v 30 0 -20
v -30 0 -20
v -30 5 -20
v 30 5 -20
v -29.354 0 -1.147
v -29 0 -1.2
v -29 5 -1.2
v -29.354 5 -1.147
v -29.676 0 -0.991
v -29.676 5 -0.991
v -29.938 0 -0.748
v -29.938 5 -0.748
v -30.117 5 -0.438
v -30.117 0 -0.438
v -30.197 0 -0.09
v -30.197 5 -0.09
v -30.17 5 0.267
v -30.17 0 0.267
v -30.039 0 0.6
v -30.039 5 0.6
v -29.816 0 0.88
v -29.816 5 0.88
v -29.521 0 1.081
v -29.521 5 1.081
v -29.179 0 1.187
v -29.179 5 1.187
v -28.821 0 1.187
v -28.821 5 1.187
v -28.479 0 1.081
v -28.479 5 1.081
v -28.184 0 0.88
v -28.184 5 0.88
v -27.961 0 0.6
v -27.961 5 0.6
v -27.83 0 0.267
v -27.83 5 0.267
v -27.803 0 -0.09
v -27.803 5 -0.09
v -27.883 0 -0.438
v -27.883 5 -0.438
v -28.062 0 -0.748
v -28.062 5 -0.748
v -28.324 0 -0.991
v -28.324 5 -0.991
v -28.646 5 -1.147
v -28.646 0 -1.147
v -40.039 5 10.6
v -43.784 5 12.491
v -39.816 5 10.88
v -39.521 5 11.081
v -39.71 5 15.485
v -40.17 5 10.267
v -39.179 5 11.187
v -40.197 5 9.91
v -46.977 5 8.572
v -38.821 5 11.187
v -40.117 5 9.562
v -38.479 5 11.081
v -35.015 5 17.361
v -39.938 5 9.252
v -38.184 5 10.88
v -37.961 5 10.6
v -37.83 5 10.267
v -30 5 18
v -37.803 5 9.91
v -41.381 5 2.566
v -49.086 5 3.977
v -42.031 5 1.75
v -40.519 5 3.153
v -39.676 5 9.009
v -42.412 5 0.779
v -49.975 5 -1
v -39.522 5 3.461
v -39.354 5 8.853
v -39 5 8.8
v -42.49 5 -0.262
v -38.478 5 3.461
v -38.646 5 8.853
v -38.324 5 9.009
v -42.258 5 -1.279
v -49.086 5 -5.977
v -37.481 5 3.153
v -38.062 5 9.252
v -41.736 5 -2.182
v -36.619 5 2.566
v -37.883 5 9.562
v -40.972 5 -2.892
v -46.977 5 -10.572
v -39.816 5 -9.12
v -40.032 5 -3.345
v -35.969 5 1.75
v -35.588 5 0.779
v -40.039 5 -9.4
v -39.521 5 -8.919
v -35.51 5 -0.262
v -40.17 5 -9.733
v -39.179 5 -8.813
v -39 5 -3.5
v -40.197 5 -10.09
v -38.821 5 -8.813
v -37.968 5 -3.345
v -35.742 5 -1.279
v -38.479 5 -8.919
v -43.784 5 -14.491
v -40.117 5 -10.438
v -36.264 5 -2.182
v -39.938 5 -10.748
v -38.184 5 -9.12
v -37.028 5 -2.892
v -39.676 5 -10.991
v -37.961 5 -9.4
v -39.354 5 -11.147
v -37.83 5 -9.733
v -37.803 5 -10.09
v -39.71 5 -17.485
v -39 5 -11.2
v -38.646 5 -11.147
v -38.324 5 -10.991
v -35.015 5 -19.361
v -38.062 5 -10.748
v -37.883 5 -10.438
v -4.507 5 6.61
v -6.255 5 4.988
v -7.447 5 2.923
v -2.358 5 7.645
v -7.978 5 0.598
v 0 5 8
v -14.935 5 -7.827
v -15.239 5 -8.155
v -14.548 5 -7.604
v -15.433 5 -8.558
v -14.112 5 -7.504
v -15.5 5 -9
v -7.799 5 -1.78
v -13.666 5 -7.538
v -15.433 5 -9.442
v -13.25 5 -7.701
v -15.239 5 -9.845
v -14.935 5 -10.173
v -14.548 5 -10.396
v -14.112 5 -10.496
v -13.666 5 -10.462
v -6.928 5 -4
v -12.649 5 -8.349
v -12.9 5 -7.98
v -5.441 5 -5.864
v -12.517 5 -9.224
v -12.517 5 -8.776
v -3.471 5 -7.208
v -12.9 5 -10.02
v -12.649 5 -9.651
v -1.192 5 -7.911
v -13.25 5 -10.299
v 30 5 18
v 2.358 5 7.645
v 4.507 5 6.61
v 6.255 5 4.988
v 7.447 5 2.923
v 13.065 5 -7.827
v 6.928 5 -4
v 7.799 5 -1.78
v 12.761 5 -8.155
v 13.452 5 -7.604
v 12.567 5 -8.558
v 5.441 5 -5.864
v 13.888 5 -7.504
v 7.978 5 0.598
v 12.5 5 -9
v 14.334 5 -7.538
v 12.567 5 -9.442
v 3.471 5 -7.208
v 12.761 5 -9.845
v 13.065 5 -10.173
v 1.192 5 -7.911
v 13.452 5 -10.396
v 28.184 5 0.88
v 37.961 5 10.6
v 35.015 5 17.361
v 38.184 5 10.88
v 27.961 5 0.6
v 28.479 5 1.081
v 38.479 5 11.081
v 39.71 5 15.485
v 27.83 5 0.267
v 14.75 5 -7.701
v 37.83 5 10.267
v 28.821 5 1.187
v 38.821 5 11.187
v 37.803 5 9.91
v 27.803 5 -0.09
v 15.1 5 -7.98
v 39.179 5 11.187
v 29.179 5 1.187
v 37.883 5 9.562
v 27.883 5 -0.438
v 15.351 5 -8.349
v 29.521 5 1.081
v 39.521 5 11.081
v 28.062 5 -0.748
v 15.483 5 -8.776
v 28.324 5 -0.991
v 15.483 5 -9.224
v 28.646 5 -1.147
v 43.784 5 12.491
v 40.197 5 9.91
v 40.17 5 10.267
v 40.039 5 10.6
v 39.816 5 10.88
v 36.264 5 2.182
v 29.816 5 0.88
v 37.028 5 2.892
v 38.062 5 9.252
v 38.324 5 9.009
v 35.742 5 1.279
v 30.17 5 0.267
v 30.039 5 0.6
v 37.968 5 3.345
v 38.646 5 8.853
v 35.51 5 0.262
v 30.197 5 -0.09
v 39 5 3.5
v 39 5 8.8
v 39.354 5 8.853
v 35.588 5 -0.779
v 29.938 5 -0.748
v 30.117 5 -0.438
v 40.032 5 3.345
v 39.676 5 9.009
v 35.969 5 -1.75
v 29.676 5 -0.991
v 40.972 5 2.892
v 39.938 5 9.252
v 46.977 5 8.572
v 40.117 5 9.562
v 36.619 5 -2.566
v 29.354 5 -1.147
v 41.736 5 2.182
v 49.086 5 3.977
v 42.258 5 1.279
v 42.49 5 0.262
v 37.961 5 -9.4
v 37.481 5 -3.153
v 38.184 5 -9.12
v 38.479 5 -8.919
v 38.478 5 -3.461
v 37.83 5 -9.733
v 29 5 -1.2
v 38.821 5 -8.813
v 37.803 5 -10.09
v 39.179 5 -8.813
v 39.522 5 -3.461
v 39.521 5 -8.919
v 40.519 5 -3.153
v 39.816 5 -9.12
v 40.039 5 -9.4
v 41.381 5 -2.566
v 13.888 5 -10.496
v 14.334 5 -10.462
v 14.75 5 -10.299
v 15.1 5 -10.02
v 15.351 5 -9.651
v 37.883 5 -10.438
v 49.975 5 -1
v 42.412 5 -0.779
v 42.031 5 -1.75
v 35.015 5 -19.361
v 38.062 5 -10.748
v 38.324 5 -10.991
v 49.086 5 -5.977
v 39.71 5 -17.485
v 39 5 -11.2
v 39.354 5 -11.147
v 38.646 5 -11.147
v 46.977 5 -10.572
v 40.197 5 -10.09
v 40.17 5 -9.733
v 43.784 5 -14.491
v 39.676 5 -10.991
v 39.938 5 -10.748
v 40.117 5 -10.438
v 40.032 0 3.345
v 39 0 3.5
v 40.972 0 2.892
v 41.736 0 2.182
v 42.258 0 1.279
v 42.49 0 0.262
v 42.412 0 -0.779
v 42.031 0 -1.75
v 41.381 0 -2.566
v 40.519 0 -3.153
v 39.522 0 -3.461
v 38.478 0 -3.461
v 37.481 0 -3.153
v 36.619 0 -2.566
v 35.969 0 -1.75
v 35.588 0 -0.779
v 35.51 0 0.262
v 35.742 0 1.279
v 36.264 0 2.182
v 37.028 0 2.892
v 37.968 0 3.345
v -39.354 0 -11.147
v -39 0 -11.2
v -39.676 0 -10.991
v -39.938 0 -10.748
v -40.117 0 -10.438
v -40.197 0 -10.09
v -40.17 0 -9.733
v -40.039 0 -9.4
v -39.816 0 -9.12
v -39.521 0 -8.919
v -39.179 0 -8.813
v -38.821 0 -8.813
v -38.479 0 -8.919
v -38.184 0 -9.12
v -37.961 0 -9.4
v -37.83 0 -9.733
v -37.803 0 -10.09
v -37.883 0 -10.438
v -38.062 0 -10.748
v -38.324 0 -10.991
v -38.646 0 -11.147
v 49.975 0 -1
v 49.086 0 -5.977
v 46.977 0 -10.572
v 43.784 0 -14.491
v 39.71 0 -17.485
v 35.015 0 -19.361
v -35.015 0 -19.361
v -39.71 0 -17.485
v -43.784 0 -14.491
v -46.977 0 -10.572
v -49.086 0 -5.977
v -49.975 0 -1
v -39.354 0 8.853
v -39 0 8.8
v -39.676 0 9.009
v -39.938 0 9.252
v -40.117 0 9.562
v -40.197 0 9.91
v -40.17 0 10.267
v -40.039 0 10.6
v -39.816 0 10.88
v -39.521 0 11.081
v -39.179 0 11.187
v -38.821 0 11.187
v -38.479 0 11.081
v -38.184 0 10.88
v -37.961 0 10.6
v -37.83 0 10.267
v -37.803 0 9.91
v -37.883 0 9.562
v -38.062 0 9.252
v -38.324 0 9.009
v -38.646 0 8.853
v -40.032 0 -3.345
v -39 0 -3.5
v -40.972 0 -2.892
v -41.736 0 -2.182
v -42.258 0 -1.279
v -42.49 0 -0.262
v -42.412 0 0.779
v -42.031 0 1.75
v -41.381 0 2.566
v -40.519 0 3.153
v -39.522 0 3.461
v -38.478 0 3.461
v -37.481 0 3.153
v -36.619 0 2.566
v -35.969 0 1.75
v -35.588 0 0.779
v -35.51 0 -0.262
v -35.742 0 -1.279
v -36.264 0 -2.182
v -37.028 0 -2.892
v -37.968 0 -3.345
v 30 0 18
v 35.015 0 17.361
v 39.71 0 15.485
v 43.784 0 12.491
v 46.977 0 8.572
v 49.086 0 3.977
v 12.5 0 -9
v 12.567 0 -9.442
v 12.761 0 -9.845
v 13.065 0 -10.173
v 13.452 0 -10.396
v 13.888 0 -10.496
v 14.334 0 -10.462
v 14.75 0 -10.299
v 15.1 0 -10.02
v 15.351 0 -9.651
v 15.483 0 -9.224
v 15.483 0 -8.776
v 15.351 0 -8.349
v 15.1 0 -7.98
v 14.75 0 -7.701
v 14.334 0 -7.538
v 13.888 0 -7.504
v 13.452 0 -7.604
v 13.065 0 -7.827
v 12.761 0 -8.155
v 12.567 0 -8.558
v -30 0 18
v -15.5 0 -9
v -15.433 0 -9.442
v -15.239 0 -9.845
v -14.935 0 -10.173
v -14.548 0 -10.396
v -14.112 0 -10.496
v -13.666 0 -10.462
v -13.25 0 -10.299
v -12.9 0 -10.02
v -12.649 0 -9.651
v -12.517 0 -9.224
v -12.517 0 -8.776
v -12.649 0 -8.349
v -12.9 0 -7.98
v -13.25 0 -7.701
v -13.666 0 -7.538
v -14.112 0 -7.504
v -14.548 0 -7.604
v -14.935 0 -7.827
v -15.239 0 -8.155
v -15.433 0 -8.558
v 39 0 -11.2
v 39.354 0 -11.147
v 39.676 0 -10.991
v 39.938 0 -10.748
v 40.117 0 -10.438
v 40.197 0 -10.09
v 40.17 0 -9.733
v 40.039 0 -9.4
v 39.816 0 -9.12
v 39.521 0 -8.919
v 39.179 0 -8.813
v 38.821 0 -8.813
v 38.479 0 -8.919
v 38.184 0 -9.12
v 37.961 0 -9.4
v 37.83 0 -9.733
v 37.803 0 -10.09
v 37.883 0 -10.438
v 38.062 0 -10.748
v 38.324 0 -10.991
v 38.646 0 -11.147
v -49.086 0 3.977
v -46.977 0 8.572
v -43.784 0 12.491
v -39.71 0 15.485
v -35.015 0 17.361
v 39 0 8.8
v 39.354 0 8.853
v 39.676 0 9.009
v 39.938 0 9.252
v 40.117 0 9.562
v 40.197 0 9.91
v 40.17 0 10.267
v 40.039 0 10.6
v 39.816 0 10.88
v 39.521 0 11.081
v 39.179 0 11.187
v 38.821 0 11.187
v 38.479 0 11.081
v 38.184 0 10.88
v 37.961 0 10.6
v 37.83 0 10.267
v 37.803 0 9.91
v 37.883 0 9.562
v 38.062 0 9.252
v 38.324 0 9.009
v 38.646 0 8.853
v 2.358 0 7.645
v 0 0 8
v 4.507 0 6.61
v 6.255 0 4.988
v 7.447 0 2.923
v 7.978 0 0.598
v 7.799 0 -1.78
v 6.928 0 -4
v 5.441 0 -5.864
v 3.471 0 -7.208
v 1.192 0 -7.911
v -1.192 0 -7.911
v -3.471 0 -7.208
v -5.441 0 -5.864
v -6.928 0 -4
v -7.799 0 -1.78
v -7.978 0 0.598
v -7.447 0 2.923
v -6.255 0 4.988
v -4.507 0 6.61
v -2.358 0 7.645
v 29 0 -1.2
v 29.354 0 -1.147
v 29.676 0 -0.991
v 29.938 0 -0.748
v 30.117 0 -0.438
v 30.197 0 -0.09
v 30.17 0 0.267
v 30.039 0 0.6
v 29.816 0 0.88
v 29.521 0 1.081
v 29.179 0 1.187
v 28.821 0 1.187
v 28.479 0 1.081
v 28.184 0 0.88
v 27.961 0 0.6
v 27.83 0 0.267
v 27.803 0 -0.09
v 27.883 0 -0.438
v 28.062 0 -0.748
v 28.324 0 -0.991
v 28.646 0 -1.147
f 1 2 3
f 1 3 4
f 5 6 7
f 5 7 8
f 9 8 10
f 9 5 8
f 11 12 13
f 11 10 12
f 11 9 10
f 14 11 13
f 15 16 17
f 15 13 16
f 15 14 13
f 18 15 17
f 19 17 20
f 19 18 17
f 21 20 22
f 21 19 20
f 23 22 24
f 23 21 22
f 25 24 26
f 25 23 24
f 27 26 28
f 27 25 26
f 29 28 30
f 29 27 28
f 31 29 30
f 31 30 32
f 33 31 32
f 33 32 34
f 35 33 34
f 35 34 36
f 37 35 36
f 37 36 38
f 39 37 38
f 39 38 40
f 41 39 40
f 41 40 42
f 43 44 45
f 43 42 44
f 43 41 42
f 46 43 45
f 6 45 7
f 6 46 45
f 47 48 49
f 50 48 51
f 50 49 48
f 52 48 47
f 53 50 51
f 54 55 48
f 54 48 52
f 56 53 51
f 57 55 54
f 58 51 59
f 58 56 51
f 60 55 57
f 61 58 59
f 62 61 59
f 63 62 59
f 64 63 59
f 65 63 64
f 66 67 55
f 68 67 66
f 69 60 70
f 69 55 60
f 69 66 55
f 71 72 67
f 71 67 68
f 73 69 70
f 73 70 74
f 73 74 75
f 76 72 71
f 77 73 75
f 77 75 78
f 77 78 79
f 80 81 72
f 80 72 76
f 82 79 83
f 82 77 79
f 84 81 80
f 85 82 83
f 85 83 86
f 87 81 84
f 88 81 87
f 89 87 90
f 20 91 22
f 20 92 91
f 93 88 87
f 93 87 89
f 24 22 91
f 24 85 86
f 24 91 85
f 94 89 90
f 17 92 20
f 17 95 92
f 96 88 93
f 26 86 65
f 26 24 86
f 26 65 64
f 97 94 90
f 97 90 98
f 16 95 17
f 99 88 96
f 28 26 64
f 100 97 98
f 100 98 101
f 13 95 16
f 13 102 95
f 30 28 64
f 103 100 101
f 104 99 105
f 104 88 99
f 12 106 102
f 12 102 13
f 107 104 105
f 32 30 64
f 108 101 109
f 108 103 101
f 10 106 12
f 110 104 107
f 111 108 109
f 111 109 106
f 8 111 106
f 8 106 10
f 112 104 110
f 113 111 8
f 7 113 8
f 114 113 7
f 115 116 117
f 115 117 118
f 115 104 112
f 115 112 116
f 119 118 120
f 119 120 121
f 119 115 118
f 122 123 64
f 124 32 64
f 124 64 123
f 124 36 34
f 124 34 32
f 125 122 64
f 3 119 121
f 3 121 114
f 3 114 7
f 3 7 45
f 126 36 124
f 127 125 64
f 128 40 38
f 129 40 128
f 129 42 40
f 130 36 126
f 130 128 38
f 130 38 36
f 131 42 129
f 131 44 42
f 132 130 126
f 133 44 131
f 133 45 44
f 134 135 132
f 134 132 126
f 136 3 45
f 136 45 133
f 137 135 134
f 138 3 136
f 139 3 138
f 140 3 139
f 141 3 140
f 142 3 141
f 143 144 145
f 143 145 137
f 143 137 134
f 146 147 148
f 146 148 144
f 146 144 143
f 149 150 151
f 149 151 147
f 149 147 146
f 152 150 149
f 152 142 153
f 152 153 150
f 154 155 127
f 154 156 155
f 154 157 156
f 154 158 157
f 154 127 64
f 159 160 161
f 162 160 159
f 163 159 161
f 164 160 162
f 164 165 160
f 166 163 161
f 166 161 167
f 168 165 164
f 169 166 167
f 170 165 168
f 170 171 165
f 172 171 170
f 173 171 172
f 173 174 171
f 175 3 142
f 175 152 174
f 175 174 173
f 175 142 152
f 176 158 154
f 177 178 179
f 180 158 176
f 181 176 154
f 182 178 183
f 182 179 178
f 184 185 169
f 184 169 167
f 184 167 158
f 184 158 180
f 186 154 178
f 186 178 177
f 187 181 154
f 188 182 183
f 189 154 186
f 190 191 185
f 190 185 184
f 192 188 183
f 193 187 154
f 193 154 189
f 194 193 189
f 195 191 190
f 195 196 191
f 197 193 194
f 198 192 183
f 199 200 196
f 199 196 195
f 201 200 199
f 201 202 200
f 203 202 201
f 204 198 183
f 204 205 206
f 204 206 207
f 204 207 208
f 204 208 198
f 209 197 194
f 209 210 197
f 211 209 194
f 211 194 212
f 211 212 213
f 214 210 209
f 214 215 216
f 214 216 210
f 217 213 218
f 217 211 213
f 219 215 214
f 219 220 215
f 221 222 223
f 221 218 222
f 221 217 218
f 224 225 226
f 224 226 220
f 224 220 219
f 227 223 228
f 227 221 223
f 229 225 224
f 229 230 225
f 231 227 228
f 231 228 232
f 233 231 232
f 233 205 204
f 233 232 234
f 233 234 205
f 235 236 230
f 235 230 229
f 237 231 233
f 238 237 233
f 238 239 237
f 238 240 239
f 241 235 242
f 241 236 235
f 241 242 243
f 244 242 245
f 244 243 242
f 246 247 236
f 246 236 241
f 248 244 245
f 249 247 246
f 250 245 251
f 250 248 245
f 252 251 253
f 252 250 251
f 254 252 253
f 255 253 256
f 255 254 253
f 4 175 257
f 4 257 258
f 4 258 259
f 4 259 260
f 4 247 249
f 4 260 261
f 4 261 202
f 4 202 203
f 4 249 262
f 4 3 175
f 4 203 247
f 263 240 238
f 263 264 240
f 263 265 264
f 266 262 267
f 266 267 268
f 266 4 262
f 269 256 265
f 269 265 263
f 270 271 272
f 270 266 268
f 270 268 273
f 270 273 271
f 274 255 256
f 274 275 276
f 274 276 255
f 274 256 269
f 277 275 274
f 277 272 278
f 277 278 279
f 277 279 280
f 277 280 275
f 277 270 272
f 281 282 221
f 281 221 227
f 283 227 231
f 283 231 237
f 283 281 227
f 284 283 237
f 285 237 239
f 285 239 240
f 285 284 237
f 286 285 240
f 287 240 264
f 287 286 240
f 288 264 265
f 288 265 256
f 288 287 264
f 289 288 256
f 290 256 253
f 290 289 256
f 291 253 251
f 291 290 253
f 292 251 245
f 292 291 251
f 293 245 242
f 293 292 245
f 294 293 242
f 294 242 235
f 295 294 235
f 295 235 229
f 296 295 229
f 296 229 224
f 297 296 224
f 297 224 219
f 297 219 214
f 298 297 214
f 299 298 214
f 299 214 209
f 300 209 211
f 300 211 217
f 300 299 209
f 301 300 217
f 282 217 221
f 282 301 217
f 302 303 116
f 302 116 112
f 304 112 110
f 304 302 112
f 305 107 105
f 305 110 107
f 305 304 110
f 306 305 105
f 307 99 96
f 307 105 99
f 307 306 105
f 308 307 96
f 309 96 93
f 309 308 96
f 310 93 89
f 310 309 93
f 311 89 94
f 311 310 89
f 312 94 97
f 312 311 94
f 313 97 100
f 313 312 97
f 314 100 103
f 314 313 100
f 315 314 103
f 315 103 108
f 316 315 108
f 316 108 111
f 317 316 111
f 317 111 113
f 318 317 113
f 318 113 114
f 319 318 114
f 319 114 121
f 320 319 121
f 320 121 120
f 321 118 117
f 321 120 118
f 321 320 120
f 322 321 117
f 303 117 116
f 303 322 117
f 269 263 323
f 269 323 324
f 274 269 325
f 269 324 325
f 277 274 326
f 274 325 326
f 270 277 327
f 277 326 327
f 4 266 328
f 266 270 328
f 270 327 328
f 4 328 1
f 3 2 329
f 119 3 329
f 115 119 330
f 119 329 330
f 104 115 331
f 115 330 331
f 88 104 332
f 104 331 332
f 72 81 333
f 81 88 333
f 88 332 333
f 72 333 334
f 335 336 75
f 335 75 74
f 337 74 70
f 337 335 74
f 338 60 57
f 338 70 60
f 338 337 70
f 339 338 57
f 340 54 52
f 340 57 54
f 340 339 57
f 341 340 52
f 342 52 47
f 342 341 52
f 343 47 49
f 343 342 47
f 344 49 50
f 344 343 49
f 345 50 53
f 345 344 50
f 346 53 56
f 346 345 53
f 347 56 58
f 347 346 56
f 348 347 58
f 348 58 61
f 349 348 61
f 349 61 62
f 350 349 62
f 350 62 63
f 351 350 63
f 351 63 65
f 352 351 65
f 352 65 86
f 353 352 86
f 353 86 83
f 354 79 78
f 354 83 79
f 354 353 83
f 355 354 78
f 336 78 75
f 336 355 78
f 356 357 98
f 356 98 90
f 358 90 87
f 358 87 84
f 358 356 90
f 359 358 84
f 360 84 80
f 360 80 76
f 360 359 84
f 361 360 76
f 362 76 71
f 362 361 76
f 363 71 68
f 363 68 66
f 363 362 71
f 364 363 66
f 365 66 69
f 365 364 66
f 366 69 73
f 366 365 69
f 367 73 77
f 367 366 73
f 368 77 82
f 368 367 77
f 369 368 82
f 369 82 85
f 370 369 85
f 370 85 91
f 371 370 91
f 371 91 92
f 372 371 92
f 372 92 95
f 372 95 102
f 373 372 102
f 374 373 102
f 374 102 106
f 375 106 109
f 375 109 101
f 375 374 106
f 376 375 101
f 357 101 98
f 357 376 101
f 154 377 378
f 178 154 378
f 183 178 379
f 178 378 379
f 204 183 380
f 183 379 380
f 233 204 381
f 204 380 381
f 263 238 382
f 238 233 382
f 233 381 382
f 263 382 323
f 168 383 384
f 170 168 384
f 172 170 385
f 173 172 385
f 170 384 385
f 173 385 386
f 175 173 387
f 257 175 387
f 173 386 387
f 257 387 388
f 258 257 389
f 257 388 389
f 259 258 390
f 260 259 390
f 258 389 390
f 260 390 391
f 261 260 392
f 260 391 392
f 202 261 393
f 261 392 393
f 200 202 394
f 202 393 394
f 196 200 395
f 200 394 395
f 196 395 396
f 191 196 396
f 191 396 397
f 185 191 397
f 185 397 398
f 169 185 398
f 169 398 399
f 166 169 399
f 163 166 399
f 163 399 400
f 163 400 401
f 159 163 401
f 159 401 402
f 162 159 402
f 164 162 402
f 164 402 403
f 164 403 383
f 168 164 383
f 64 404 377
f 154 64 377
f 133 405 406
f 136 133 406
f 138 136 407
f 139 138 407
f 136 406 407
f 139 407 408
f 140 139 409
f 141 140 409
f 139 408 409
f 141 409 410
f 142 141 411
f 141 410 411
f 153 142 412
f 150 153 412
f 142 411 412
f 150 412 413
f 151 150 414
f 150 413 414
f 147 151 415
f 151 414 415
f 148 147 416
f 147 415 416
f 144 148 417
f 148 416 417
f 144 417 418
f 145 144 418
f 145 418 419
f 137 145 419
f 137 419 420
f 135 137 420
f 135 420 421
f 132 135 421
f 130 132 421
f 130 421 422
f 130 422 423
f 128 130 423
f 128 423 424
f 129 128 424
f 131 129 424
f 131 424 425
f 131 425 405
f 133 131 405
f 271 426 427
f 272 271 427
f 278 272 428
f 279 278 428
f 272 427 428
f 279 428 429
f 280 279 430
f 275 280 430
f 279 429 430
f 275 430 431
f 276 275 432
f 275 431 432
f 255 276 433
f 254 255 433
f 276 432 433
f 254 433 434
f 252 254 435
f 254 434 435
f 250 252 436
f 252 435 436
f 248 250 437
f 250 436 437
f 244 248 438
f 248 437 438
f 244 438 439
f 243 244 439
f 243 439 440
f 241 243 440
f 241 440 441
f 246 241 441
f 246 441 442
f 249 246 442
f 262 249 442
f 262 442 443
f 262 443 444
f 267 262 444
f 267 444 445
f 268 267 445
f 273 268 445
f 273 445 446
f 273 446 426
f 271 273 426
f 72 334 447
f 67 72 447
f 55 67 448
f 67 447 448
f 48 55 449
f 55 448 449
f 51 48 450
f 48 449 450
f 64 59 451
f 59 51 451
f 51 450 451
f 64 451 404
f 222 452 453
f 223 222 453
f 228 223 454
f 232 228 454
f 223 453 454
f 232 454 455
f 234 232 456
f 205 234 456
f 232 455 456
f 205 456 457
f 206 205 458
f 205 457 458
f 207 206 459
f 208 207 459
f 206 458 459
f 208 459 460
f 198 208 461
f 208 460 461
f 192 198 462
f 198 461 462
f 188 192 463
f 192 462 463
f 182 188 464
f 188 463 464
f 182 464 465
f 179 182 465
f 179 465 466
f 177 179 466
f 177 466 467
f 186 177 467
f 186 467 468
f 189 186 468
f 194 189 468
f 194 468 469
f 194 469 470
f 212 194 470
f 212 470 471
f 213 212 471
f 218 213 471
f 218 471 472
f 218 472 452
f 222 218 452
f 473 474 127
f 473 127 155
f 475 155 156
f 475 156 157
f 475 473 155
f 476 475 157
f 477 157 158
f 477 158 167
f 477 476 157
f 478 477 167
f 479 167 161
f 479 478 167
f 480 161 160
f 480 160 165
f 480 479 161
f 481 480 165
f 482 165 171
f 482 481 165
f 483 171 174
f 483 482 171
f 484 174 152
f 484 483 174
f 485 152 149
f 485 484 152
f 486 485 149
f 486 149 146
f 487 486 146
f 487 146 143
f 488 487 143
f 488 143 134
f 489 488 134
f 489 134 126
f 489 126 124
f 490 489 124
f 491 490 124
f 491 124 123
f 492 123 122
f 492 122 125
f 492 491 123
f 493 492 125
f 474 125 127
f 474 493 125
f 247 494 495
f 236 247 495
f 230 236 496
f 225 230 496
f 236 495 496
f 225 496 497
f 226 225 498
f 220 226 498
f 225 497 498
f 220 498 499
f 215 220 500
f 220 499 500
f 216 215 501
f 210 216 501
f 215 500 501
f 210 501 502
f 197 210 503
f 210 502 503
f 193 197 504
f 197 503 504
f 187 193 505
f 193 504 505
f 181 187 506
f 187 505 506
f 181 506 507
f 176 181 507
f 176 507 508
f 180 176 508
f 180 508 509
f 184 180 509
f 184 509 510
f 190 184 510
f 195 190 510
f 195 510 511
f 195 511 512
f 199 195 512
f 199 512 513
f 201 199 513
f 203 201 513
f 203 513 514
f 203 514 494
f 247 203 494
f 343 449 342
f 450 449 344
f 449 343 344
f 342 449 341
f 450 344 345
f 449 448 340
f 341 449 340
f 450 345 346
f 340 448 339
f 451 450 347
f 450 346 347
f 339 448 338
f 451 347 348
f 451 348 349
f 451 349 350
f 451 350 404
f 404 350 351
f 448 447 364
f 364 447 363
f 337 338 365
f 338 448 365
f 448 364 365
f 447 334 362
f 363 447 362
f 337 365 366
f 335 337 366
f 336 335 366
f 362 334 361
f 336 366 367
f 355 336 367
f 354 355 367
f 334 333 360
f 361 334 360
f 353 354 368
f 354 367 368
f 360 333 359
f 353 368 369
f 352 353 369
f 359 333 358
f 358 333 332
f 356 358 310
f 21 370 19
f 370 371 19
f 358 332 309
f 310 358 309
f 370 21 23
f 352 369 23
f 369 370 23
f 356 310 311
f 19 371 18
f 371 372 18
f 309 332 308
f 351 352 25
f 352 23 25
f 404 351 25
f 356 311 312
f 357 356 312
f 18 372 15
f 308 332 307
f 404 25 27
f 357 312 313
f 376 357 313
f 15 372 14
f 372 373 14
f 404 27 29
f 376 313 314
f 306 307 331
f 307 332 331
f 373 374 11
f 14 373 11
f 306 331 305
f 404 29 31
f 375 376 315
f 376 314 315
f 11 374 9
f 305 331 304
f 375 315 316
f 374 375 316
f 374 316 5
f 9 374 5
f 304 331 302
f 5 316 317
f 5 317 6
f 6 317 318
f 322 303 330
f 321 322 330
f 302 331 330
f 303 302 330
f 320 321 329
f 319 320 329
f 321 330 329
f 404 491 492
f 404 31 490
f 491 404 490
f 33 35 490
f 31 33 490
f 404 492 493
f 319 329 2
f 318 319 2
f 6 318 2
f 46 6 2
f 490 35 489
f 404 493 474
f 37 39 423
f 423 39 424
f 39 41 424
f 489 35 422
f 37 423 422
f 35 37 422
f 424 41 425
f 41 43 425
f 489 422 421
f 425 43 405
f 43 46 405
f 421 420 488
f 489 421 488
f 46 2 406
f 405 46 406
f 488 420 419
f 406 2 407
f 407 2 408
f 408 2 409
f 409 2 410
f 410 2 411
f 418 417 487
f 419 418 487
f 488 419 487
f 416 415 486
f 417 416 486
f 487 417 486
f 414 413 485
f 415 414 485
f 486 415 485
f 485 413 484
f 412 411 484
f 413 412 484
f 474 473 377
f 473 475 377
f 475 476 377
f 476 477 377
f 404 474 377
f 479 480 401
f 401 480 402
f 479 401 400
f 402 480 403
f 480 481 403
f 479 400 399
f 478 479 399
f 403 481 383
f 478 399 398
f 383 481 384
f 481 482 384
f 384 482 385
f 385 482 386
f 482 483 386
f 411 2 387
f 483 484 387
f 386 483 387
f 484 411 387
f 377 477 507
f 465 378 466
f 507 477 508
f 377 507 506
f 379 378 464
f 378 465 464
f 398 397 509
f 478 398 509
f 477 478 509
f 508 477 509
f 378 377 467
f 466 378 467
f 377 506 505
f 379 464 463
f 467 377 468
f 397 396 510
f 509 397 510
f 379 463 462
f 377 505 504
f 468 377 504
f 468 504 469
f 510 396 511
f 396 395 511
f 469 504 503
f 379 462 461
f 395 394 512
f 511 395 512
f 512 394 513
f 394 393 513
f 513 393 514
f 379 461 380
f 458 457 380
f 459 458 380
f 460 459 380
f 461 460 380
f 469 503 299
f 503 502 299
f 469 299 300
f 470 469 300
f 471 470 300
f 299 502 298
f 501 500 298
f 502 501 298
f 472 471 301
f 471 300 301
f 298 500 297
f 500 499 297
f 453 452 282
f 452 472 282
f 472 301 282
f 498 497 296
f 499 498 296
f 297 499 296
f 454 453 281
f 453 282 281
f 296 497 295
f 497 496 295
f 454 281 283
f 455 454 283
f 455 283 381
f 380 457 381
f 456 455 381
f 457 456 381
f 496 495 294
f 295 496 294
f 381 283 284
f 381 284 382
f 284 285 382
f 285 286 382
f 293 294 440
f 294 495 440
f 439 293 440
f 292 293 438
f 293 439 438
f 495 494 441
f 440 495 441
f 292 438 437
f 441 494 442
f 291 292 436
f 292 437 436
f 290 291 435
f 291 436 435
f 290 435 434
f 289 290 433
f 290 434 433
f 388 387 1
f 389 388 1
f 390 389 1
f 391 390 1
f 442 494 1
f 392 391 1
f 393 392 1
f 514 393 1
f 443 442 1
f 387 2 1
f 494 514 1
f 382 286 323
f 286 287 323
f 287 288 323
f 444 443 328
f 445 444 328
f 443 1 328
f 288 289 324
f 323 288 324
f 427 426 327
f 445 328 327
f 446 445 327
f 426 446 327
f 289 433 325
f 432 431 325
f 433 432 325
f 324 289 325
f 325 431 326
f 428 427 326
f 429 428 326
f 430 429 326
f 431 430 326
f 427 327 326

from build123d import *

# Parameters (mm, degrees)
SKETCH_1_W          = 100
SKETCH_1_H          = 38
SKETCH_1_R          = 8
SKETCH_1_R_2        = 3.5
EXTRUDE_1_DEPTH     = 5
FILLET_1_R          = 20
MM_TRANSITIONAL_1_D = 3
HOLE_WIZARD_M2_1_D  = 2.4


with BuildPart() as part:
    # 草图1 → 凸台-拉伸1 (new body)
    with BuildSketch(Plane(origin=(0, 0, 0), x_dir=(1, 0, 0), z_dir=(0, 1, 0))):
        with Locations((0, 1)):
            Rectangle(SKETCH_1_W, SKETCH_1_H)
        with Locations(Location((0, 0, 0), (0, 0, 270))):
            Circle(SKETCH_1_R, mode=Mode.SUBTRACT)
        with Locations(Location((39, 0, 0), (0, 0, 270))):
            Circle(SKETCH_1_R_2, mode=Mode.SUBTRACT)
        with Locations(Location((-39, 0, 0), (0, 0, 90))):
            Circle(SKETCH_1_R_2, mode=Mode.SUBTRACT)
    extrude(amount=EXTRUDE_1_DEPTH)

    # 圆角1
    # the kernel refuses this fillet: 20 mm, written as the material it takes off along each edge
    with BuildSketch(Plane(origin=(-50, -50, -20), x_dir=(1, 0, 0), z_dir=(0, 1, 0))) as fillet_1_piece_1:
        with BuildLine():
            CenterArc((FILLET_1_R, -FILLET_1_R), FILLET_1_R, 90, 90)
            Line((0, -FILLET_1_R), (0, 0))
            Line((0, 0), (FILLET_1_R, 0))
        make_face()
    extrude(amount=105, mode=Mode.SUBTRACT)
    with BuildSketch(Plane(origin=(-50, -50, 18), x_dir=(1, 0, 0), z_dir=(0, 1, 0)), Plane(origin=(50, -50, -20), x_dir=(-1, 0, 0), z_dir=(0, 1, 0)), Plane(origin=(50, -50, 18), x_dir=(0, 0, -1), z_dir=(0, 1, 0))) as fillet_1_piece_2:
        with BuildLine():
            CenterArc((FILLET_1_R, FILLET_1_R), FILLET_1_R, 180, 90)
            Line((0, FILLET_1_R), (0, 0))
            Line((0, 0), (FILLET_1_R, 0))
        make_face()
    extrude(amount=105, mode=Mode.SUBTRACT)

    # 大小mm Transitional 暗销孔1 (through all)
    with Locations(Plane(origin=(0, 5, 0), x_dir=(1, 0, 0), z_dir=(0, 1, 0))):
        with Locations((14, 9), (-14, 9)):
            Hole(MM_TRANSITIONAL_1_D / 2)

    # M2 间隙孔1 (through all)
    with Locations(Plane.ZX.offset(5)):
        with Locations((-10, 39), (10, 39), (0, 29)):
            hole_wizard_m2_1 = Hole(HOLE_WIZARD_M2_1_D / 2)

    # 镜向1: M2 间隙孔1 across plane
    add(hole_wizard_m2_1.mirror(Plane(origin=(0, 0, 0), x_dir=(0, 0, 1), z_dir=(1, 0, 0))), mode=Mode.SUBTRACT)


solid = part.part
